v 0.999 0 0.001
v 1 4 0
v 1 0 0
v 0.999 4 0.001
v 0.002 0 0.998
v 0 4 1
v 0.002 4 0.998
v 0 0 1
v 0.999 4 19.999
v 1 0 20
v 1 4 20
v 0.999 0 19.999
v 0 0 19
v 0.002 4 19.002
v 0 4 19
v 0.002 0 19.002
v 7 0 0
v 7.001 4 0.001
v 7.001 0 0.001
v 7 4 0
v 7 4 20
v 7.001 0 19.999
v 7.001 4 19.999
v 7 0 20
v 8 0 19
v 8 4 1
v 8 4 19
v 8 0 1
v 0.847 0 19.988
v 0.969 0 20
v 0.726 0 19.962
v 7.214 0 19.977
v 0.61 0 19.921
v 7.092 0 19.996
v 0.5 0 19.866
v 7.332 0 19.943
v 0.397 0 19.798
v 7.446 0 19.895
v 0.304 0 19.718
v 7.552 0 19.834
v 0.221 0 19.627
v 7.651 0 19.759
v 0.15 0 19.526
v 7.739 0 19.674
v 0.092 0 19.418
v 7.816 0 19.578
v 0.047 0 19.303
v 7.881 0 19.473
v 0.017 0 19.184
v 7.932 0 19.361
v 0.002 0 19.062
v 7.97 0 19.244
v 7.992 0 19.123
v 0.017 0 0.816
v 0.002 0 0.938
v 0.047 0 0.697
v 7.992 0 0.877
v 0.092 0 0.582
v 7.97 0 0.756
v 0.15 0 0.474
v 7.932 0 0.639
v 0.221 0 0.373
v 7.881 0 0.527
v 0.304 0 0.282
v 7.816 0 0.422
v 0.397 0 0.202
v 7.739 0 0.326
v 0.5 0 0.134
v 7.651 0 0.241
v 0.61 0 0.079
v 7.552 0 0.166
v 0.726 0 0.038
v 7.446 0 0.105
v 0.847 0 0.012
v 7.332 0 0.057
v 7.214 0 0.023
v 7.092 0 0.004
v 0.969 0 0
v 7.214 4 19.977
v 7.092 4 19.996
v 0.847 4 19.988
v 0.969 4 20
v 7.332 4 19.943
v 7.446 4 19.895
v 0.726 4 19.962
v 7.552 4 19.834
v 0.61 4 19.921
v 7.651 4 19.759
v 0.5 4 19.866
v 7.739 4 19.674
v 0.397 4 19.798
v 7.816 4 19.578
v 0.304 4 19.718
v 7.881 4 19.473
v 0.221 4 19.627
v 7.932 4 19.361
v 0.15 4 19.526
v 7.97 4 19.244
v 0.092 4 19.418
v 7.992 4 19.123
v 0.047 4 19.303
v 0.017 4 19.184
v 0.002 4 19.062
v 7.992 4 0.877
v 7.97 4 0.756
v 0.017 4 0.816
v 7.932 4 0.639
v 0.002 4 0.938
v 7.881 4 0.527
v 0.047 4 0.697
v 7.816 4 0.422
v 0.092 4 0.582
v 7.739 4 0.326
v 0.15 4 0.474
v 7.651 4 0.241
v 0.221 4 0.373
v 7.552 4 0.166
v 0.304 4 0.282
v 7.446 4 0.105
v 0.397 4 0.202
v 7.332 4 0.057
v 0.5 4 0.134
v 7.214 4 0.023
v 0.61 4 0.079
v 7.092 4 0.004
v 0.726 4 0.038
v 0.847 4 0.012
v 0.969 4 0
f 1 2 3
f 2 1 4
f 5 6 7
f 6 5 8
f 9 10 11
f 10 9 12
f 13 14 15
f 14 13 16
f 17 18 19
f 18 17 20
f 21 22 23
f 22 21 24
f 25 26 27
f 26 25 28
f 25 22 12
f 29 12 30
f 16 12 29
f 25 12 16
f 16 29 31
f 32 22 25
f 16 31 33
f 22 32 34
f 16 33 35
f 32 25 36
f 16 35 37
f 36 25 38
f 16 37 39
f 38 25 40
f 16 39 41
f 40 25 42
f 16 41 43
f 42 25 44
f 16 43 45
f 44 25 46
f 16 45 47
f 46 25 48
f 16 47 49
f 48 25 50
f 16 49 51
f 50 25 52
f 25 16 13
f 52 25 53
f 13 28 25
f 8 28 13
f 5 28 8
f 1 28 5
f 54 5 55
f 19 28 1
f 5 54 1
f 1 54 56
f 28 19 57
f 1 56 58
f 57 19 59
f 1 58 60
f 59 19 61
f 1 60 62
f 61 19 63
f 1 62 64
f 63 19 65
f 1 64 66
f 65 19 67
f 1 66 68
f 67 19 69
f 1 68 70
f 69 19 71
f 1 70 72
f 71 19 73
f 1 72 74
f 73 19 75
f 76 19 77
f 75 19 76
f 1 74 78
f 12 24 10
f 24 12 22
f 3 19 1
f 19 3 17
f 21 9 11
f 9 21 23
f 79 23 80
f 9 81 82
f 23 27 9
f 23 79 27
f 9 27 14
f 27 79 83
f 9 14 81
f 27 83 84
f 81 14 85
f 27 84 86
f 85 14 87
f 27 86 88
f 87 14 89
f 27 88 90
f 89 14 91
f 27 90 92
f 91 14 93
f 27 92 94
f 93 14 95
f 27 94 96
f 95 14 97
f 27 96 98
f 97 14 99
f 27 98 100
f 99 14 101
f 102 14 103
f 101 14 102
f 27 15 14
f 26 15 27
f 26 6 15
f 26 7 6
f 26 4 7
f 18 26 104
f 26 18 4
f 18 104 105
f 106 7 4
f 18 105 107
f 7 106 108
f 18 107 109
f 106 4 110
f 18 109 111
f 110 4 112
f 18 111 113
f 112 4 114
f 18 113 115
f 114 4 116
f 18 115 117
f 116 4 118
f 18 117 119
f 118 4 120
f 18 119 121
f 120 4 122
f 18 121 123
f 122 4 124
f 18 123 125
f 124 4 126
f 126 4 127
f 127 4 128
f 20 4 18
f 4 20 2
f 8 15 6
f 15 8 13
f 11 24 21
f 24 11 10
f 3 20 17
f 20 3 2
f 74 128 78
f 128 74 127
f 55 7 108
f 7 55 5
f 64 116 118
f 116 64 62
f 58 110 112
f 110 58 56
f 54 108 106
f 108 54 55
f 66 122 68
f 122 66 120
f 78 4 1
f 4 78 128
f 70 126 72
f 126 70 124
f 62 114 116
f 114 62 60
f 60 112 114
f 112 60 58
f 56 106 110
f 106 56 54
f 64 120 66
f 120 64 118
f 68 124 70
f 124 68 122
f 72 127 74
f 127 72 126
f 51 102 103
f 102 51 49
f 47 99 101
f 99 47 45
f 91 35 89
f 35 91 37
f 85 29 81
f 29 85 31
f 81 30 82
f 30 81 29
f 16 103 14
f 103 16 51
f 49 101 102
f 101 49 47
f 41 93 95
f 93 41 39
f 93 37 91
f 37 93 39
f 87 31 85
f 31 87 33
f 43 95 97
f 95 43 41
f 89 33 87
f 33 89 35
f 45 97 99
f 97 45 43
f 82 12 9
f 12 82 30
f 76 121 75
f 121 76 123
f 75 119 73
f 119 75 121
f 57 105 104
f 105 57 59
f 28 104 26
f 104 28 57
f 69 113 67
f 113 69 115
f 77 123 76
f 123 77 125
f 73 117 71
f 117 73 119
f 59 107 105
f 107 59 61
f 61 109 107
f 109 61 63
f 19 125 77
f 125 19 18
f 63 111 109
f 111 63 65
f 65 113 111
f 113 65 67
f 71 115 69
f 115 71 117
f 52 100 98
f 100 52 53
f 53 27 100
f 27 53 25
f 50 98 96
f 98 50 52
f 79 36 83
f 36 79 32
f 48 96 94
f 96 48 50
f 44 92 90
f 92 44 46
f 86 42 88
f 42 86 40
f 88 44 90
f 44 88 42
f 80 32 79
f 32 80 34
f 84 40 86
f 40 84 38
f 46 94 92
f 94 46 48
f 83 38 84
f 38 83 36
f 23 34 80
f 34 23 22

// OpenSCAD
//
// OpenSCAD utility modules
//

$fa=0.125; // default minimum facet angle is now 0.5
$fs=0.125; // default minimum facet size is now 0.5 mm
d_inch = 25.4;
screw_tap_dia_14_20   = 0.201 * d_inch;
screw_clear_dia_14_20 = 0.260 * d_inch;
screw_washer_dia_14_20 = 9/16 * d_inch;	// #12 washer

//-----------------------------------------------------------------------------

module slot_without_hull(width=10, length=20, height=2){
     // 
     // Make a slot with rounded ends, given the diameter of the
     // circles at each end, the length, and the height.
     // Do this without using hull(), so that the result
     // can be exported via FreeCAD as a STEP file, for
     // CNC machining, e.g. with Fusion360.
     //
     // hull() cannot be exported by FreeCAD into STEP files.
     //
     // width is used as the circle diameter.
     // a positive element is created; use difference() to cut the slot.
     // the slot is positioned along x, centered on y, and
     // with its bottom at z=0.

     cube_dx = length - width;
     dia = width;

     union(){
	  for (dx=[-1, 1]){
	       translate([dx * cube_dx/2, 0, 0])
		    cylinder(d=dia, h=height);
	  }
	  translate([-cube_dx/2, -width/2, 0]) cube([cube_dx, width, height]);
     }
}

// slot_without_hull(width=10, length=30, height=5);

//-----------------------------------------------------------------------------

module cube_with_rounded_corners(xyz=[20,8,4], dia=2, no_xplus_rounding=false){
     // dia = diameter of cylinder for corners
     //
     // create cube with rounded corners (along z, so this is like a xy plane), without using hull().
     // This allows the cube to be exported to an STEP file using FreeCAD,
     // for manufacturing.
     //
     // rounding is done along the z axis
     //
     // start with a cube, trim the corners at 45deg, then add cylinders
     // at each corner.
     dx = xyz[0];
     dy = xyz[1];
     dz = xyz[2];
     rad = ((dx > 0) && (dy > 0) ? dia/2 : 0);
     cr = rad / 2;
     difference(){
	  cube(xyz);
	  // cutoff four corners
	  for (x=[0, (no_xplus_rounding ? 0 : 1)]){
	       for (y=[0,1]){
		    translate([x*dx, y*dy, 0])
		    mirror([x, y, 0])
		    color("red")
			 translate([cr, cr, -0.01])
			 scale([1,1,1.1])
			 rotate([0, 0, -45])
			 translate([-dx/2, -dy, 0])
			 cube(xyz);
		    }
	  }
     }
     // add cylinders to four corners
     if (dx > 0){
	  for (x=[0, (no_xplus_rounding ? 0 : 1)]){
	       for (y=[0,1]){
		    color("orange")
			 translate([x*(dx-dia), y*(dy-dia), 0])
			 translate([rad, rad, 0])
			 cylinder(d=dia, h=dz);
	       }
	  }
     }
}

//-----------------------------------------------------------------------------

module cube_with_rounded_corners_yz(xyz=[20,8,4], dia=2, no_xplus_rounding=false){
     //
     // rounded cube but in yz plane (round along x)
     // do this by making a xy plane cube, then rotating to flip x <-> z
     //
     dx = xyz[0];
     dy = xyz[1];
     dz = xyz[2];
     translate([0, 0, dz]){
	  rotate([0, 90, 0]){
	       cube_with_rounded_corners(xyz=[dz, dy, dx], dia=dia, no_xplus_rounding=no_xplus_rounding);
	  }
     }
}

module cube_with_rounded_corners_xz(xyz=[20,8,4], dia=2, no_xplus_rounding=false){
     //
     // rounded cube but in xz plane (round along y)
     // do this by making a xy plane cube, then rotating to flip y <-> z
     //
     dx = xyz[0];
     dy = xyz[1];
     dz = xyz[2];
     translate([0, dy, 0]){
	  rotate([90, 0, 0]){
	       cube_with_rounded_corners(xyz=[dx, dz, dy], dia=dia, no_xplus_rounding=no_xplus_rounding);
	  }
     }
}

module screw_with_head_clear(dz, xpos, ypos, head=true, threaded=false){
     color("red")
	  mirror([0,0,1])
	  translate([xpos, ypos , dz-0.01]){
	  cylinder(d=(threaded ? screw_tap_dia_14_20 : screw_clear_dia_14_20), h = 100);
	  if(head){
	       cylinder(d=screw_washer_dia_14_20, h = 10);
	  }
     }
}

// cube_with_rounded_corners(xyz=[20,8,4], dia=2);
// cube_with_rounded_corners(xyz=[4,8,20], dia=2);
// cube_with_rounded_corners_yz(xyz=[4,8,20], dia=2);
cube_with_rounded_corners_xz(xyz=[8,4,20], dia=2);
// cube([4,8,20]);

//-----------------------------------------------------------------------------
// hex nut module

module hexaprism(
	ri =  1.0,  // radius of inscribed circle
	h  =  1.0)  // height of hexaprism
{
     // ra = ri*2/sqrt(3);
     // ra = ri;
     ra = ri / (cos(180/6));	// convert from apothem to circumradius
     // echo("nut dia=", ri*2, ", points dia = ", 2*ra);
     color("red")
	  cylinder(r = ra, h=h, $fn=6, center=false);
}

module hex_nut(thick, dia){
     color("red")
	  translate([0,0,-0.01]) hexaprism(ri=dia/2, h=thick+0.02);
}
